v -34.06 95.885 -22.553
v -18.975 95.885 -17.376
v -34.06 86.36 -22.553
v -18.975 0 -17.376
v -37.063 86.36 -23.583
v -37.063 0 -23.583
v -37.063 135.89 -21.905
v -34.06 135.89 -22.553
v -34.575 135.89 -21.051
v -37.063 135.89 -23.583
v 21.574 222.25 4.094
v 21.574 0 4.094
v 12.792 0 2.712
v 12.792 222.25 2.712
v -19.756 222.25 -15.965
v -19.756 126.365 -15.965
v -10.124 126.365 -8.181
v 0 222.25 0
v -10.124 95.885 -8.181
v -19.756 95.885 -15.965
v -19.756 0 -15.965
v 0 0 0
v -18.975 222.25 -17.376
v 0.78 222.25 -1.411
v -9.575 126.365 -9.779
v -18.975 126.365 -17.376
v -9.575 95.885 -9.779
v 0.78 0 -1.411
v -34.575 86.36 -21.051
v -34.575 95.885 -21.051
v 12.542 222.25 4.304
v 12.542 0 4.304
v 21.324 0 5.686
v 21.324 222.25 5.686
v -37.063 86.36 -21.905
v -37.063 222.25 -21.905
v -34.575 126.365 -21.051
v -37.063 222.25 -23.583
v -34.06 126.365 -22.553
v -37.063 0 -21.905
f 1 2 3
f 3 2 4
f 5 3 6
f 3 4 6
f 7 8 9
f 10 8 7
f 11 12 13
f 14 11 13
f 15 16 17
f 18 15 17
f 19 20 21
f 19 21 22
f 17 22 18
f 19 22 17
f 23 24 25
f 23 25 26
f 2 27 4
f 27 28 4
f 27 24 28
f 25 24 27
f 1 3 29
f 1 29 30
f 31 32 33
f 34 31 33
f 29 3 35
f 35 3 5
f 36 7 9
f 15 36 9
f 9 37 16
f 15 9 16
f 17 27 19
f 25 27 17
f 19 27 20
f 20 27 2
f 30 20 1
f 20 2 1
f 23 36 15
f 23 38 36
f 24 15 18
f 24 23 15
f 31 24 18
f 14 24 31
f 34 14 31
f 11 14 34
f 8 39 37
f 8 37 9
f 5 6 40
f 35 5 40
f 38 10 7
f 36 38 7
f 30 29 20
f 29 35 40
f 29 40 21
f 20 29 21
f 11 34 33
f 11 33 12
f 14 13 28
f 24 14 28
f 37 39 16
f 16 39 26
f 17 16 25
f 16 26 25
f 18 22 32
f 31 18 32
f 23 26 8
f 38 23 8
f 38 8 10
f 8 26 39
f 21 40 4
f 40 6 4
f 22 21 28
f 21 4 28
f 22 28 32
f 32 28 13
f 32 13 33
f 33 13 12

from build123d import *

# Parameters (mm, degrees)
BOSS_EXTRUDE2_DEPTH     = 222.25
SKETCH4_W               = 3.175
SKETCH4_H               = 9.525
SKETCH4_W_2             = 11.35728502
SKETCH4_H_2             = 30.48
CUT_EXTRUDE2_DEPTH      = 20.034637206
CUT_EXTRUDE2_DEPTH_BACK = 28.684375793


with BuildPart() as part:
    # Sketch3 → Boss-Extrude2 (new body)
    with BuildSketch(Plane(origin=(0, 0, 0), x_dir=(1, 0, 0), z_dir=(0, 1, 0))):
        Polygon((-37.062566366, 21.904788086), (-19.755538483, 15.964920897), (0, 0), (12.541749156, -4.304397313), (21.323689681, -5.686287551), (21.57426256, -4.093891817), (12.792322036, -2.712001578), (0.780092903, 1.410661549), (-18.975445581, 17.375582446), (-37.062566366, 23.583181811), align=None)
    extrude(amount=BOSS_EXTRUDE2_DEPTH)

    # Sketch4 → Cut-Extrude2 (cut, two sides)
    with BuildSketch(Plane(origin=(3.335400558, 0, -9.718377301), x_dir=(-0.945844814, 0, -0.324619144), z_dir=(0.324619144, 0, -0.945844814))) as cut_extrude2_sk:
        with Locations((41.123488466, 131.1275)):
            Rectangle(SKETCH4_W, SKETCH4_H)
        Polygon((42.710988466, 95.885), (42.710988466, 126.365), (39.535988466, 126.365), (23.588273486, 126.365), (23.588273486, 95.885), (39.535988466, 95.885), align=None)
        with Locations((41.123488466, 91.1225)):
            Rectangle(SKETCH4_W, SKETCH4_H)
        with Locations((17.909630976, 111.125)):
            Rectangle(SKETCH4_W_2, SKETCH4_H_2)
    extrude(amount=CUT_EXTRUDE2_DEPTH, mode=Mode.SUBTRACT)
    extrude(cut_extrude2_sk.sketch, amount=-CUT_EXTRUDE2_DEPTH_BACK, mode=Mode.SUBTRACT)


solid = part.part
